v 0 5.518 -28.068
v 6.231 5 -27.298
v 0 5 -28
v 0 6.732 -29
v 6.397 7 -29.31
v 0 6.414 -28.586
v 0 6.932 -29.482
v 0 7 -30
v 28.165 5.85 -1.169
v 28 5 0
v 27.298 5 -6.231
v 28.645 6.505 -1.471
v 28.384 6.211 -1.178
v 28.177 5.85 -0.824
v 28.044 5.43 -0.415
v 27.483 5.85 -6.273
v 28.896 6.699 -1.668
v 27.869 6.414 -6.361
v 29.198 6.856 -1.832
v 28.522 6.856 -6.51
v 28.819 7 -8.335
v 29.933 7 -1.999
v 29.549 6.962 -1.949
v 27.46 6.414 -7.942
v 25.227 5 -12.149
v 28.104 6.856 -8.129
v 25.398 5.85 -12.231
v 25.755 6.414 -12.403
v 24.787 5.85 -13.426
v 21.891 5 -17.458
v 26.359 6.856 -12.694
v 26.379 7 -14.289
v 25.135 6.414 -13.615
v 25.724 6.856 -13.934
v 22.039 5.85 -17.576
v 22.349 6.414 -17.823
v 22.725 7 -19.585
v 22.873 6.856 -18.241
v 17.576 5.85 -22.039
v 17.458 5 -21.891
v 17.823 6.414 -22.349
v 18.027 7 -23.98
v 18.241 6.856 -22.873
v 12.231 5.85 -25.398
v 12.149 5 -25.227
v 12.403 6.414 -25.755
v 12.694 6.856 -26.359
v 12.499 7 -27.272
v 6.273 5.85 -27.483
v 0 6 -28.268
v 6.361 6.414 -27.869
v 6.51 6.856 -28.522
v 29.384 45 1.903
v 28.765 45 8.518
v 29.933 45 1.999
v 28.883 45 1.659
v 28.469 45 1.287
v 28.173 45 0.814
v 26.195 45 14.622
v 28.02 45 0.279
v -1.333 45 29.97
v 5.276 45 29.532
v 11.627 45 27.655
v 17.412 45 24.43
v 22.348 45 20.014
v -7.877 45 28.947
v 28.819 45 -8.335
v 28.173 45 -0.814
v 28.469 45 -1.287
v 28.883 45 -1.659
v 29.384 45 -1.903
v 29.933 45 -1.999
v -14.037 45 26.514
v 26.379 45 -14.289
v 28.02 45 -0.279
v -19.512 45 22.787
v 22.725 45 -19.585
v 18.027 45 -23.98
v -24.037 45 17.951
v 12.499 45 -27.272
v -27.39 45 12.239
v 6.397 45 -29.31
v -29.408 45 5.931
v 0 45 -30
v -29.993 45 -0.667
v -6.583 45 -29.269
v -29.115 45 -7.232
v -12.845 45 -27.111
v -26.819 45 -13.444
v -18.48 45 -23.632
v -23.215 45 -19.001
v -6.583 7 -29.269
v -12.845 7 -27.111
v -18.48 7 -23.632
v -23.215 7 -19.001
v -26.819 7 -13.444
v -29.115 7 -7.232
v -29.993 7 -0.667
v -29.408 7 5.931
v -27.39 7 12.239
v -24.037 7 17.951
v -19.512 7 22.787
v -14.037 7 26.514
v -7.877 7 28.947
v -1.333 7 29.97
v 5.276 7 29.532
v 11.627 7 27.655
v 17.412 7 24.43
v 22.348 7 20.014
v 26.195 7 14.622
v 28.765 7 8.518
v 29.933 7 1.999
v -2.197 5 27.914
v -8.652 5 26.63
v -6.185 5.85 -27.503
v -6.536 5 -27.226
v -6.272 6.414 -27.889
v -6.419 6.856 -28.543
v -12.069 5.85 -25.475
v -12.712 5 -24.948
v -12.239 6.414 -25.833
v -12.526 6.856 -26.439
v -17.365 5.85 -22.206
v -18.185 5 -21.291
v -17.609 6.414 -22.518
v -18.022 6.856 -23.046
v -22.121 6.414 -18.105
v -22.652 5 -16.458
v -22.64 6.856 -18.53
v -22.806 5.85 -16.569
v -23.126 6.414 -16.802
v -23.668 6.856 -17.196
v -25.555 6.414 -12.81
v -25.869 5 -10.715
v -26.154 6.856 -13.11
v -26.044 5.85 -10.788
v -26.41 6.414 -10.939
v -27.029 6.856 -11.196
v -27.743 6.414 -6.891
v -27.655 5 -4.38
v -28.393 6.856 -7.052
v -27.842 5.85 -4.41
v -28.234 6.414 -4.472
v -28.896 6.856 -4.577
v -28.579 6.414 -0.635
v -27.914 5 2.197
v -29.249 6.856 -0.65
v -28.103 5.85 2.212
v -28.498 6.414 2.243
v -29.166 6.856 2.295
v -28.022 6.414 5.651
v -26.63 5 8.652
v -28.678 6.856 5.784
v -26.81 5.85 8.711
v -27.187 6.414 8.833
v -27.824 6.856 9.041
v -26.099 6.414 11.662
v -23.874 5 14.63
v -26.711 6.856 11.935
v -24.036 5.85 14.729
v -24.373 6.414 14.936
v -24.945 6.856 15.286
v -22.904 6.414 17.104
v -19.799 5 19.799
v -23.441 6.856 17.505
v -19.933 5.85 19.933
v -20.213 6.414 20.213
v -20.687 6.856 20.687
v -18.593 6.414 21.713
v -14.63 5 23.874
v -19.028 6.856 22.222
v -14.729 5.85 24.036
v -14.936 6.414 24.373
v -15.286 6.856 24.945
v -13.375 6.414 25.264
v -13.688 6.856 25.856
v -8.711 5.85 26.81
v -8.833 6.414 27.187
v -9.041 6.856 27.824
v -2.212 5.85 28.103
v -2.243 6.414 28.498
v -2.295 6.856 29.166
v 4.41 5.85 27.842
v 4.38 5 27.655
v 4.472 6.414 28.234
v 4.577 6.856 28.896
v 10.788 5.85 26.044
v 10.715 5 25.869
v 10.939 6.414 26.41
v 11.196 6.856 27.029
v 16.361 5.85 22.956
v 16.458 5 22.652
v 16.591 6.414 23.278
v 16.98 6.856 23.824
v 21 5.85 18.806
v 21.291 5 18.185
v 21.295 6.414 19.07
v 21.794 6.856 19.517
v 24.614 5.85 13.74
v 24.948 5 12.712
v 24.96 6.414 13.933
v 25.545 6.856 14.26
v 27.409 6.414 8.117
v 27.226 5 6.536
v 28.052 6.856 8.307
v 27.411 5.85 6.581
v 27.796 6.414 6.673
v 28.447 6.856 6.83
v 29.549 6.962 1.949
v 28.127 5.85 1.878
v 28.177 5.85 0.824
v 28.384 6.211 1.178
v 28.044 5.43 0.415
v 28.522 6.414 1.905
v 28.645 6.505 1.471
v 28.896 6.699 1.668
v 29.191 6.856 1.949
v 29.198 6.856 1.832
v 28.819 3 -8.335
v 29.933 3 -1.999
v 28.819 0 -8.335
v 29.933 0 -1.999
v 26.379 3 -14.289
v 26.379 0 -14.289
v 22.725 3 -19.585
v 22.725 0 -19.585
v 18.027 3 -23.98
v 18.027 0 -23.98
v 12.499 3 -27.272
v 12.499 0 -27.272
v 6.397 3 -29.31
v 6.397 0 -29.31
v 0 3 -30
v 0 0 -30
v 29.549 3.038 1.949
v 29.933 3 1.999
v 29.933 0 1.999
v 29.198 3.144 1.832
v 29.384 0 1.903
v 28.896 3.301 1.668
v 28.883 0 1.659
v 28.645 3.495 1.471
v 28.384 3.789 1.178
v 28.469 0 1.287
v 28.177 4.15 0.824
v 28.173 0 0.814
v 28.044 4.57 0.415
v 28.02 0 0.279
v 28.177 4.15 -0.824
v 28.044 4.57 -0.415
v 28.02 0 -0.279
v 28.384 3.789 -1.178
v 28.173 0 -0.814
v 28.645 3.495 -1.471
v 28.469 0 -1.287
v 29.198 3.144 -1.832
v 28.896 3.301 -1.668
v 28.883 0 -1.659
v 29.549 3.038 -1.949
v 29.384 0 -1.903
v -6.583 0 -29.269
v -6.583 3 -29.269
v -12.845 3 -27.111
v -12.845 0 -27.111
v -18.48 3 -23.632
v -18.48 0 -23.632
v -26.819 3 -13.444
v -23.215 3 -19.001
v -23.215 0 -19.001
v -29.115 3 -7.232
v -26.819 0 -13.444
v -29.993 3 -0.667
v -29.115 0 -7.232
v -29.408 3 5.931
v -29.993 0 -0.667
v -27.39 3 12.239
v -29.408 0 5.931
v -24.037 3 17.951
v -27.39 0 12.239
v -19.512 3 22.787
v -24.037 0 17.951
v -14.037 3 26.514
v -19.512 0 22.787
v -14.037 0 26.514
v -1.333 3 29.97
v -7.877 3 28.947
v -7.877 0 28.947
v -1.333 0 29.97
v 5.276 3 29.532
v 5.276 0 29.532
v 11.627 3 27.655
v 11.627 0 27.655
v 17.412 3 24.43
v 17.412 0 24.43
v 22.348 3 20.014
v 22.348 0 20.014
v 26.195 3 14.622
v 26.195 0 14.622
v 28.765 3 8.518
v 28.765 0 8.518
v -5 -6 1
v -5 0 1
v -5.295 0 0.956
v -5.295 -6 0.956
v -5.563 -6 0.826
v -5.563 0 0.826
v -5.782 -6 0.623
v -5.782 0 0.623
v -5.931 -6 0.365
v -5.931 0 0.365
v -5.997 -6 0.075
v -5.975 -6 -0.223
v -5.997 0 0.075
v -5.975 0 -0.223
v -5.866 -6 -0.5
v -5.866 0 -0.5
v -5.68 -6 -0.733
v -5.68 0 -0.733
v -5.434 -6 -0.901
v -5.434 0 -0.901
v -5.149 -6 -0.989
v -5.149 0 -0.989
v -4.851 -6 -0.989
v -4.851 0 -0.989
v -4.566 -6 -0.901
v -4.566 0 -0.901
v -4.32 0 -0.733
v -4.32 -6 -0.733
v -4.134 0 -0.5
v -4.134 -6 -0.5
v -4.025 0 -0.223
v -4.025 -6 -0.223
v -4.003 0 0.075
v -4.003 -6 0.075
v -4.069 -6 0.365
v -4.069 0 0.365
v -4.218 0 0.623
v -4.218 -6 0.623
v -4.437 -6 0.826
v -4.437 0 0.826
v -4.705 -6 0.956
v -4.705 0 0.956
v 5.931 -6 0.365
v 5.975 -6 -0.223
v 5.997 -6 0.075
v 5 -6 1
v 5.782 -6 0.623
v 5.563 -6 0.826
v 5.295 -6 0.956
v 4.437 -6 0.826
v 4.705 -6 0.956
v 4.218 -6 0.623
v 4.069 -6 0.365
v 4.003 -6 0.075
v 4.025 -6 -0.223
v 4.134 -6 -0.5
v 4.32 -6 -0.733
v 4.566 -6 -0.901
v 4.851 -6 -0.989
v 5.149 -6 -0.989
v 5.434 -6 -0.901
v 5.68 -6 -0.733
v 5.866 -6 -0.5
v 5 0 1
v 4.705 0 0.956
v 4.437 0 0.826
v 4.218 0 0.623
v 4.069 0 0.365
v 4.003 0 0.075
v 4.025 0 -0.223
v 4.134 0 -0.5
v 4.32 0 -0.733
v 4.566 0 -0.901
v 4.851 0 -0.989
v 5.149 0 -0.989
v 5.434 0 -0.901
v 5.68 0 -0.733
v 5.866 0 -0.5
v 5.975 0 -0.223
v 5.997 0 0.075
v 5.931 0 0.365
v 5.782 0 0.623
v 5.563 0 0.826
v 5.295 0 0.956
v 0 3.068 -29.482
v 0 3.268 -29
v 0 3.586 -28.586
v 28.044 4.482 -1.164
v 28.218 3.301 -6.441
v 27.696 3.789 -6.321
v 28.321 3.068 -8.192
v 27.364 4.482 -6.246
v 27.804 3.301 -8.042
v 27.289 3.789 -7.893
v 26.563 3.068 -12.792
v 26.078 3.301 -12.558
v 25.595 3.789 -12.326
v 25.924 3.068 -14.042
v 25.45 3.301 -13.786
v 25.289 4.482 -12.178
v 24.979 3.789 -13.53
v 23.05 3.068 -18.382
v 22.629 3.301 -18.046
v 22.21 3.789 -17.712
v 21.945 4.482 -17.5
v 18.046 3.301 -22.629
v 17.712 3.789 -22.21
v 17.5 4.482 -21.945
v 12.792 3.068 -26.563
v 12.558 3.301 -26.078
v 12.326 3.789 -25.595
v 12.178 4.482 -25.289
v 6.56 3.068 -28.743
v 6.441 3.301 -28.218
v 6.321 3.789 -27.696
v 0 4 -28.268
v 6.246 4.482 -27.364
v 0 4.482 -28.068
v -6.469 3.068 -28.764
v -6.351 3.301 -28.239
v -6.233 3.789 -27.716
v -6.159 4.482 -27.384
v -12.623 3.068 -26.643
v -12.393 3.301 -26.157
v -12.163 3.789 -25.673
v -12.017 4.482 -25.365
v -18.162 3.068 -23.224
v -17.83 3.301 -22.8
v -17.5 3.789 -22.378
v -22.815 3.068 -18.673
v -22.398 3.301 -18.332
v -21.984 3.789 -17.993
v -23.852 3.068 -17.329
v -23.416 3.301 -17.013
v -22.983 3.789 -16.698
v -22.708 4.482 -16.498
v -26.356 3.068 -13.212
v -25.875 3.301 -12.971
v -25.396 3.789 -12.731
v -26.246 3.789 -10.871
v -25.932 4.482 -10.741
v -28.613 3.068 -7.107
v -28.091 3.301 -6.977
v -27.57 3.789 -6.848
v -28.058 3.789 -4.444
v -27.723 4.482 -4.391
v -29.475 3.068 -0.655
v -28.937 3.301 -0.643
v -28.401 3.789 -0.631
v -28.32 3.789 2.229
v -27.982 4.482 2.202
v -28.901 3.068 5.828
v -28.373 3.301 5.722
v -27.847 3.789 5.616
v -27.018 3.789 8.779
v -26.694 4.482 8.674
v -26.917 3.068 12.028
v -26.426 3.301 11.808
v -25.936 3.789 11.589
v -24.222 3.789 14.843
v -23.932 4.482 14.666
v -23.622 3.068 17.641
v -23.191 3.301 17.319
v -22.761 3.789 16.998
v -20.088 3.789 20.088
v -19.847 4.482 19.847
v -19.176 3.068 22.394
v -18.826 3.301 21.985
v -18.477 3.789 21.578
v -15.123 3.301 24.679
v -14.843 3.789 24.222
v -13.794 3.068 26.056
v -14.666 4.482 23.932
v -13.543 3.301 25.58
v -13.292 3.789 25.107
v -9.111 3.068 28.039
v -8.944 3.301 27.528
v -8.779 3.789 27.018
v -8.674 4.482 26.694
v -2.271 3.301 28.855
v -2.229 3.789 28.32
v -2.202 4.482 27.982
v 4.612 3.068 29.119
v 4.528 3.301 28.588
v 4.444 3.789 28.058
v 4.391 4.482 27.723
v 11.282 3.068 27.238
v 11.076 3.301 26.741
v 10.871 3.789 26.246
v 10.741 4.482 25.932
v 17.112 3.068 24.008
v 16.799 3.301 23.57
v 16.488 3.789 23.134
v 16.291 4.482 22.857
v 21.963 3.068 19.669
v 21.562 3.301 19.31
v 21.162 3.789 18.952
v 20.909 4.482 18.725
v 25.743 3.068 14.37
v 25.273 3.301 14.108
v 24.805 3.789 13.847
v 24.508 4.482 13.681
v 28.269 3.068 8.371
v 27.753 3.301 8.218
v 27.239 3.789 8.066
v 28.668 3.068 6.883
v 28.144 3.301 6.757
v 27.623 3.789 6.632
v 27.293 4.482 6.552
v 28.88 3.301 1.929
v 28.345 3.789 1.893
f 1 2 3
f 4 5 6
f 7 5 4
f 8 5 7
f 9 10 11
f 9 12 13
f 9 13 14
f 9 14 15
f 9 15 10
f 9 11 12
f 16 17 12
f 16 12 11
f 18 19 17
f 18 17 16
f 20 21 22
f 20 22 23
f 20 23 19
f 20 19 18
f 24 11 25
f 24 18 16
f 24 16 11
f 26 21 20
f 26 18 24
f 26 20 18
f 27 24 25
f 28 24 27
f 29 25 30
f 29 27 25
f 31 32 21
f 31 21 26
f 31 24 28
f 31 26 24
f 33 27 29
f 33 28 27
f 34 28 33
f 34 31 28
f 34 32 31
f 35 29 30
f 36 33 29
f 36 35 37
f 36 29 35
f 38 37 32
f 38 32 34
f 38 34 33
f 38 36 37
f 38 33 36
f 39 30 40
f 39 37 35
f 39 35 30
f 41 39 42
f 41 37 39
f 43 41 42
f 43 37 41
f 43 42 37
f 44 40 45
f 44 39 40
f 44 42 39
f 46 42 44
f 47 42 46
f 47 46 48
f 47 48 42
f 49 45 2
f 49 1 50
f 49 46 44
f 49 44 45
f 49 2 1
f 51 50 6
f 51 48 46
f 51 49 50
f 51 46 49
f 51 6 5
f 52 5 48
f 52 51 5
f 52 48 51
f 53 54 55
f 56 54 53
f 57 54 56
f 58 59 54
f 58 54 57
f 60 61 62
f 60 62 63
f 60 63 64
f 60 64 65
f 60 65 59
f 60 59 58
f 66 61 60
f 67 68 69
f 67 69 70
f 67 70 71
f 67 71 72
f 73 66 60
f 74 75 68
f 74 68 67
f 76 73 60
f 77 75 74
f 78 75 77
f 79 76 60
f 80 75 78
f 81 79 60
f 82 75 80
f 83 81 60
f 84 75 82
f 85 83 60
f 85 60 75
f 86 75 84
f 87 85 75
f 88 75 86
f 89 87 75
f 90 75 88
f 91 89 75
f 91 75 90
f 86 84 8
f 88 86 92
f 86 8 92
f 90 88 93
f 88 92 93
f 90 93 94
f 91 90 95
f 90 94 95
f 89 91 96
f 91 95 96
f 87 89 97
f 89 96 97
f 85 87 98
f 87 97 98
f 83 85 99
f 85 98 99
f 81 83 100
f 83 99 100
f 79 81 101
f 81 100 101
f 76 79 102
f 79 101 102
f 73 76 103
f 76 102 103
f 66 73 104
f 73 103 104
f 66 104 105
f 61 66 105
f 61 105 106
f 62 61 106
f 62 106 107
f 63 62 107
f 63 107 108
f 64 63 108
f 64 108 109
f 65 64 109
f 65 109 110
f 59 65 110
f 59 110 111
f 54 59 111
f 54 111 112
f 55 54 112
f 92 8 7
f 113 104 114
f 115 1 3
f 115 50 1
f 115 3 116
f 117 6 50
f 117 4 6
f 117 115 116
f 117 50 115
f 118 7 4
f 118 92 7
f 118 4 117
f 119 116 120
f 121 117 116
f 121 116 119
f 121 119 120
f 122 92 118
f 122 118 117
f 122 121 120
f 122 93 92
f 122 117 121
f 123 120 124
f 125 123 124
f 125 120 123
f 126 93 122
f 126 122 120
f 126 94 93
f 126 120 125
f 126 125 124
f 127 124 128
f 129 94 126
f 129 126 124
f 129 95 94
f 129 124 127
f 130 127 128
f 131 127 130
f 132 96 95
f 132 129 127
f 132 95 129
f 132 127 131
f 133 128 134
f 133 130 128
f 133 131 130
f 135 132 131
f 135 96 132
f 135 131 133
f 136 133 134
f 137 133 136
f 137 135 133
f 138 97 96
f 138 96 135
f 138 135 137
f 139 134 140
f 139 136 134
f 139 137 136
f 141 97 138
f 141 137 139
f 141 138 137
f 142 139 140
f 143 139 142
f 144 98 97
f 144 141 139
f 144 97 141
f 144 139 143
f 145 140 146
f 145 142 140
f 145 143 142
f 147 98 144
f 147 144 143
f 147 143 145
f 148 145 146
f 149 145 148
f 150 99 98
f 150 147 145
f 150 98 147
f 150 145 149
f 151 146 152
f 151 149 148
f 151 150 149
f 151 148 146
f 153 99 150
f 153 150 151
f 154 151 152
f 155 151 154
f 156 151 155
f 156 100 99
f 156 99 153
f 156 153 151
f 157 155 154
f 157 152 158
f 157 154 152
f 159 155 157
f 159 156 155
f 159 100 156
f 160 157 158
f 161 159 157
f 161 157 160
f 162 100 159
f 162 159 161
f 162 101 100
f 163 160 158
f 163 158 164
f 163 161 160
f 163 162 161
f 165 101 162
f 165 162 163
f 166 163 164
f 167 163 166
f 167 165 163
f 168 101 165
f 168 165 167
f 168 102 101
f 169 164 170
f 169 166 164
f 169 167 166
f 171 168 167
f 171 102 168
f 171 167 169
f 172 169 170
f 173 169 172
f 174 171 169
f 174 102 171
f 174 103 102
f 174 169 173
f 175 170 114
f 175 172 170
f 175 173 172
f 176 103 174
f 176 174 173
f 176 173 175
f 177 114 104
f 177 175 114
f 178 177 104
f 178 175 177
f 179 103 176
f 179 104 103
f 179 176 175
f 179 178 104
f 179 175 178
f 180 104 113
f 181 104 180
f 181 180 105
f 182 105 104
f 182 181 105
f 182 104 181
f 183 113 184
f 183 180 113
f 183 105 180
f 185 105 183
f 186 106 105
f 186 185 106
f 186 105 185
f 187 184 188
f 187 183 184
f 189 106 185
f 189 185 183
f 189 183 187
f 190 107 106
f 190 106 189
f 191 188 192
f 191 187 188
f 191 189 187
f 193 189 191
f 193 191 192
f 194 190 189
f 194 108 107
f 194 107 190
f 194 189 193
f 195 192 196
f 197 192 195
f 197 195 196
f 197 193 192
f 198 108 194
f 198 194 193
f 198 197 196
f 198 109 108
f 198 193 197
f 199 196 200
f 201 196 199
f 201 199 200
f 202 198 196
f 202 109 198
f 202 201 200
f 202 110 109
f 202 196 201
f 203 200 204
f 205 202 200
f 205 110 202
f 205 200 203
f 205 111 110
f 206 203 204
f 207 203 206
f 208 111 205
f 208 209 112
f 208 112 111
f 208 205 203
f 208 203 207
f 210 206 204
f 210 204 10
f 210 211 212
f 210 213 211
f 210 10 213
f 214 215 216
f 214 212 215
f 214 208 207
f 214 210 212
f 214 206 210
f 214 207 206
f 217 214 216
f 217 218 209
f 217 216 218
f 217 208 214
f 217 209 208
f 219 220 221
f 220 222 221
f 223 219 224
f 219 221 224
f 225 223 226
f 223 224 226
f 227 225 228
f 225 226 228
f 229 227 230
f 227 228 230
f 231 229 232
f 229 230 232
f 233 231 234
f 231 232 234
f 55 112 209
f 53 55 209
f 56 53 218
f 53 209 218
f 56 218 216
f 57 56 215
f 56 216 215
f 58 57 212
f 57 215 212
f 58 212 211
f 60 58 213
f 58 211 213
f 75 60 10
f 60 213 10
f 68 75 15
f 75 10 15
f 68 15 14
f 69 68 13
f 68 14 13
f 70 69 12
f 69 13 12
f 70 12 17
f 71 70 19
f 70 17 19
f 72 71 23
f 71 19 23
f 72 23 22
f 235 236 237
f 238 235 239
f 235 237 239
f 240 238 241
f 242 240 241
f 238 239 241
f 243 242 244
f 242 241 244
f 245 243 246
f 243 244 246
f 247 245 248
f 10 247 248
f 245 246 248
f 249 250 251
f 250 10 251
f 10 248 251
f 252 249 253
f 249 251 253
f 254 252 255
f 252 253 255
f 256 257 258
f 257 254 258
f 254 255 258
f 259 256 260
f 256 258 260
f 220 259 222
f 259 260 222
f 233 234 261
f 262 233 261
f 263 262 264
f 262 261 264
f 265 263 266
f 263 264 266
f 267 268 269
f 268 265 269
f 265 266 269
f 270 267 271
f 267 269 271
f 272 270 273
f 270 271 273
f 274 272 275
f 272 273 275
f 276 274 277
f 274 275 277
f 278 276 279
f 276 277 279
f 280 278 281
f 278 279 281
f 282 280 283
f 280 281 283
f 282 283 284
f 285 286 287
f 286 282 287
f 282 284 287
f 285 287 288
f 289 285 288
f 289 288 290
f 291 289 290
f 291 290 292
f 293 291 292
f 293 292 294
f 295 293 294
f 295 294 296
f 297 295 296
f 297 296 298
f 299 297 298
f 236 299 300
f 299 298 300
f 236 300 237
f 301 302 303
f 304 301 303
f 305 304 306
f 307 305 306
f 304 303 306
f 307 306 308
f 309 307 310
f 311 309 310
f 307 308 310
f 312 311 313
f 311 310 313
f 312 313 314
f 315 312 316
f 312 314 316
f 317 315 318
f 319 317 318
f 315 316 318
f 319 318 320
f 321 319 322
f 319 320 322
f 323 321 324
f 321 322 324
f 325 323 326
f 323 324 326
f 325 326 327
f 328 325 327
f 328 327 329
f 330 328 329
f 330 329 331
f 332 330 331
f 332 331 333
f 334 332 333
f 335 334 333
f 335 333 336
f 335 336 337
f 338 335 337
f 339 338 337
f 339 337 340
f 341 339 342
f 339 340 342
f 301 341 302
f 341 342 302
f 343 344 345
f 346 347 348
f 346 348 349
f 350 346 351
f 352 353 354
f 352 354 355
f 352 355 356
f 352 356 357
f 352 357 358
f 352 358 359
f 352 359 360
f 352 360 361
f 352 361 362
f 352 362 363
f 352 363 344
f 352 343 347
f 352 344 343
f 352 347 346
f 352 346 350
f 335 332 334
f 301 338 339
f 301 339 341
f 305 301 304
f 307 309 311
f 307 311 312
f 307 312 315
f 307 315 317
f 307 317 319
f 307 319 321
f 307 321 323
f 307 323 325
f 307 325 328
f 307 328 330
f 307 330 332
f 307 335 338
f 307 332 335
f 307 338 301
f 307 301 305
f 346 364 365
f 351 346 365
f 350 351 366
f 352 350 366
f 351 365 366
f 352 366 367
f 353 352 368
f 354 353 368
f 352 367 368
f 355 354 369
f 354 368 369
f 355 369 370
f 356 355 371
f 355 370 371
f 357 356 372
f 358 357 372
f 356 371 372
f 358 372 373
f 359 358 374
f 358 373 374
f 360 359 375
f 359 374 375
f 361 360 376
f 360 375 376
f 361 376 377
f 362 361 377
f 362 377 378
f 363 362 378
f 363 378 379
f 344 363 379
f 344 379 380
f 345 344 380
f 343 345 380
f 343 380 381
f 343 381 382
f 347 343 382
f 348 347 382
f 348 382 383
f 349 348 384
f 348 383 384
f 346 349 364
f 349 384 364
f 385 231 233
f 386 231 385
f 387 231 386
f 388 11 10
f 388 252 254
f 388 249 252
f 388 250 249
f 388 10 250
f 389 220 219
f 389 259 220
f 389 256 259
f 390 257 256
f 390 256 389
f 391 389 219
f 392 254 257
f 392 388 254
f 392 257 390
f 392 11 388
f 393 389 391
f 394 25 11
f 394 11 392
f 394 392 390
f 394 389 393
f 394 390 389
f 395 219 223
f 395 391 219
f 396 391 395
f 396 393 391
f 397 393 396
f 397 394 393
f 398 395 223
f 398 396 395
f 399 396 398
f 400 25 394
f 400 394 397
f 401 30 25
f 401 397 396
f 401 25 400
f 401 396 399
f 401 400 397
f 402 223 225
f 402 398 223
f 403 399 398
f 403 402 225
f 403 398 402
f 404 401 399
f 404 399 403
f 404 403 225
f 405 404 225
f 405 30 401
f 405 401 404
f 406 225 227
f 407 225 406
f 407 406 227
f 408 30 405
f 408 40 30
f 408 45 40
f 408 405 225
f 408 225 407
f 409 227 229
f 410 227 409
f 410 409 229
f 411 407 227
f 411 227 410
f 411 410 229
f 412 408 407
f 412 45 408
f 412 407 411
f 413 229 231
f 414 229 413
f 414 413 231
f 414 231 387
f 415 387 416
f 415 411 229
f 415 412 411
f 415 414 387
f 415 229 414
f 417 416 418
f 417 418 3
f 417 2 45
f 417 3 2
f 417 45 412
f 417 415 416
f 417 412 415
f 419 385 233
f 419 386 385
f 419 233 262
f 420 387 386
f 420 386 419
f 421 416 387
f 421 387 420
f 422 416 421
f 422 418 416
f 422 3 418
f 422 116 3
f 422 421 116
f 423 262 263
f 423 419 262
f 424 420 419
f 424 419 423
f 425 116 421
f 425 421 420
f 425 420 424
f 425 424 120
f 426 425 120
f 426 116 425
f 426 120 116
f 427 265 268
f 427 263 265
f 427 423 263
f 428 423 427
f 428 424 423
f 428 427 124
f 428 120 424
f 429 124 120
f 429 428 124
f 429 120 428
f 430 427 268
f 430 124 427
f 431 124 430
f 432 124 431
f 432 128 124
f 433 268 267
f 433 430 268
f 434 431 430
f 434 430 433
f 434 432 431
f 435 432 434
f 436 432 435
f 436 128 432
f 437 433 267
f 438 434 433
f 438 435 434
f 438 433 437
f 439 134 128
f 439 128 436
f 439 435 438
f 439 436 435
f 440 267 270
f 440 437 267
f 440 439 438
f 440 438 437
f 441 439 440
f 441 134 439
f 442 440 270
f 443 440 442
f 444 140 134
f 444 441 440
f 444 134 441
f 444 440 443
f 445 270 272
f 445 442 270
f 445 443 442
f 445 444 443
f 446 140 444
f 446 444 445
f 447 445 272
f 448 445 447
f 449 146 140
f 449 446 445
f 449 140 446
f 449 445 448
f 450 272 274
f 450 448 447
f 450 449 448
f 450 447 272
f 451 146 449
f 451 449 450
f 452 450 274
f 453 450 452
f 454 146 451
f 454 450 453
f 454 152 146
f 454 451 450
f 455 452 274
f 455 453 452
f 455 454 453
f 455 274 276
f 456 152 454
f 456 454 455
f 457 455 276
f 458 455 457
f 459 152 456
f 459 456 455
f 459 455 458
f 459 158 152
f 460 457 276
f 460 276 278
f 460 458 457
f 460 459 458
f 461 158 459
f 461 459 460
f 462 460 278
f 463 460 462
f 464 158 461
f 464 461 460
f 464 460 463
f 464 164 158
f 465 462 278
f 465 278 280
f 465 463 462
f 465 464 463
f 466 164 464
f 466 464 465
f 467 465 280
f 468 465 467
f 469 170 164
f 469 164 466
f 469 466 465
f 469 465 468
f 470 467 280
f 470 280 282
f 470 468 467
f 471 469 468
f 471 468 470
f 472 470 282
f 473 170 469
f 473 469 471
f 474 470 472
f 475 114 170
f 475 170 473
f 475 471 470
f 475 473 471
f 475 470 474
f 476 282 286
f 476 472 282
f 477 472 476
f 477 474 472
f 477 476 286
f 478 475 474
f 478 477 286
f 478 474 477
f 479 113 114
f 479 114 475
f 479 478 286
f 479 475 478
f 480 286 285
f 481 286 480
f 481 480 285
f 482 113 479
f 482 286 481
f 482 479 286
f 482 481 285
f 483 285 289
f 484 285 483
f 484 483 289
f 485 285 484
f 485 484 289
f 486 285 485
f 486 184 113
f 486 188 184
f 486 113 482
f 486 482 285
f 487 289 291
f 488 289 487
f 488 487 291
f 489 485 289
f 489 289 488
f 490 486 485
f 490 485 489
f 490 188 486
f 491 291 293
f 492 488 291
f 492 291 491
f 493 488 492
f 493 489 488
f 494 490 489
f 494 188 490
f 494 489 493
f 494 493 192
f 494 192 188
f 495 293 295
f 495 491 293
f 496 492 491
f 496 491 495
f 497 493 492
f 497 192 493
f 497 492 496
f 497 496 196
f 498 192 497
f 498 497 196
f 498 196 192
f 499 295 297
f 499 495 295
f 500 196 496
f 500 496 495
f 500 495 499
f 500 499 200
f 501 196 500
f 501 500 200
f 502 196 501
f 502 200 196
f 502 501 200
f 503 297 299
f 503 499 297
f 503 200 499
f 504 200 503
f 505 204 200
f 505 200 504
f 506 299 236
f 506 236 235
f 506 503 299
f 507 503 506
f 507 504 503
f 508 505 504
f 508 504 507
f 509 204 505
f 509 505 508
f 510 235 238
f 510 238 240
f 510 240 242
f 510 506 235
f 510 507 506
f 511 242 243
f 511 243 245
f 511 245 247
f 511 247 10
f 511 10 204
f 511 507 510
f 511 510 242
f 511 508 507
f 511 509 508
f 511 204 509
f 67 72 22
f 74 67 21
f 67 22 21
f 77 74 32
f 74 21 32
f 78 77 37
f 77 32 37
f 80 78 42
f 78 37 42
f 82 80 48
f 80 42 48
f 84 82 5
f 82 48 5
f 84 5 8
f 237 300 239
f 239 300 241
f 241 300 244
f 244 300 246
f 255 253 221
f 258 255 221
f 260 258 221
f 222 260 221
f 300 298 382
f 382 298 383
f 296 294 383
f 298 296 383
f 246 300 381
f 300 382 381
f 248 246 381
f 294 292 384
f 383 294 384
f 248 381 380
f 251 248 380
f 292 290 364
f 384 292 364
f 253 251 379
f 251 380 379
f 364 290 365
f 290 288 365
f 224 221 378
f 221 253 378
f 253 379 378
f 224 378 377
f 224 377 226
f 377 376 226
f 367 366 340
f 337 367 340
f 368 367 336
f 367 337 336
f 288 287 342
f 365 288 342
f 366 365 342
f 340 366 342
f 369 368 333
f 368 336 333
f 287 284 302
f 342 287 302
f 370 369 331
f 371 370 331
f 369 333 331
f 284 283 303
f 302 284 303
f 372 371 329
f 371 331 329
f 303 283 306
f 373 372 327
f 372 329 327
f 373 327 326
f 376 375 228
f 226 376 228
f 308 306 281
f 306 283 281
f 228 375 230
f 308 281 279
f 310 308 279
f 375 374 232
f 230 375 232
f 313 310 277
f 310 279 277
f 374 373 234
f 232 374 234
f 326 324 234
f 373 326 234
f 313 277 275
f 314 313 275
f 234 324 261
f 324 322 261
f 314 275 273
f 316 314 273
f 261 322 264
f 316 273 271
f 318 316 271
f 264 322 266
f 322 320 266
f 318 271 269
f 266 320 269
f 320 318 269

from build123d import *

# Parameters (mm, degrees)
SKETCH_2_R          = 30
EXTRUDE_1_DEPTH     = 45
SKETCH_3_R          = 2
SKETCH_4_R          = 1
EXTRUDE_2_DEPTH     = 6
SKETCH_5_R          = 2
CUT_EXTRUDE_1_DEPTH = 45


with BuildPart() as part:
    # Эскиз2 → Бобышка-Вытянуть1 (new body)
    with BuildSketch(Plane(origin=(0, 0, 0), x_dir=(1, 0, 0), z_dir=(0, 1, 0))):
        with Locations(Location((0, 0, 0), (0, 0, 90))):
            Circle(SKETCH_2_R)
    extrude(amount=EXTRUDE_1_DEPTH)

    # Эскиз3 → Вырез-Повернуть1 (revolve, cut)
    with BuildSketch(Plane(origin=(0, 0, 0), x_dir=(0, 0, -1), z_dir=(1, 0, 0)), mode=Mode.PRIVATE) as cut_revolve_1_sk:
        with Locations((-30, 5)):
            Circle(SKETCH_3_R)
    revolve(cut_revolve_1_sk.sketch.rotate(Axis((0, 0, 0), (0, 1, 0)), 180), axis=Axis((0, 0, 0), (0, 1, 0)), mode=Mode.SUBTRACT)

    # Эскиз4 → Бобышка-Вытянуть2 (add)
    with BuildSketch(Plane.XZ):
        with Locations(Location((5, 0, 0), (0, 0, 90))):
            Circle(SKETCH_4_R)
        with Locations(Location((-5, 0, 0), (0, 0, 90))):
            Circle(SKETCH_4_R)
    extrude(amount=EXTRUDE_2_DEPTH)

    # Эскиз5 → Вырез-Вытянуть1 (cut)
    with BuildSketch(Plane.XZ):
        with Locations((30, 0)):
            Circle(SKETCH_5_R)
    extrude(amount=-CUT_EXTRUDE_1_DEPTH, mode=Mode.SUBTRACT)


solid = part.part
